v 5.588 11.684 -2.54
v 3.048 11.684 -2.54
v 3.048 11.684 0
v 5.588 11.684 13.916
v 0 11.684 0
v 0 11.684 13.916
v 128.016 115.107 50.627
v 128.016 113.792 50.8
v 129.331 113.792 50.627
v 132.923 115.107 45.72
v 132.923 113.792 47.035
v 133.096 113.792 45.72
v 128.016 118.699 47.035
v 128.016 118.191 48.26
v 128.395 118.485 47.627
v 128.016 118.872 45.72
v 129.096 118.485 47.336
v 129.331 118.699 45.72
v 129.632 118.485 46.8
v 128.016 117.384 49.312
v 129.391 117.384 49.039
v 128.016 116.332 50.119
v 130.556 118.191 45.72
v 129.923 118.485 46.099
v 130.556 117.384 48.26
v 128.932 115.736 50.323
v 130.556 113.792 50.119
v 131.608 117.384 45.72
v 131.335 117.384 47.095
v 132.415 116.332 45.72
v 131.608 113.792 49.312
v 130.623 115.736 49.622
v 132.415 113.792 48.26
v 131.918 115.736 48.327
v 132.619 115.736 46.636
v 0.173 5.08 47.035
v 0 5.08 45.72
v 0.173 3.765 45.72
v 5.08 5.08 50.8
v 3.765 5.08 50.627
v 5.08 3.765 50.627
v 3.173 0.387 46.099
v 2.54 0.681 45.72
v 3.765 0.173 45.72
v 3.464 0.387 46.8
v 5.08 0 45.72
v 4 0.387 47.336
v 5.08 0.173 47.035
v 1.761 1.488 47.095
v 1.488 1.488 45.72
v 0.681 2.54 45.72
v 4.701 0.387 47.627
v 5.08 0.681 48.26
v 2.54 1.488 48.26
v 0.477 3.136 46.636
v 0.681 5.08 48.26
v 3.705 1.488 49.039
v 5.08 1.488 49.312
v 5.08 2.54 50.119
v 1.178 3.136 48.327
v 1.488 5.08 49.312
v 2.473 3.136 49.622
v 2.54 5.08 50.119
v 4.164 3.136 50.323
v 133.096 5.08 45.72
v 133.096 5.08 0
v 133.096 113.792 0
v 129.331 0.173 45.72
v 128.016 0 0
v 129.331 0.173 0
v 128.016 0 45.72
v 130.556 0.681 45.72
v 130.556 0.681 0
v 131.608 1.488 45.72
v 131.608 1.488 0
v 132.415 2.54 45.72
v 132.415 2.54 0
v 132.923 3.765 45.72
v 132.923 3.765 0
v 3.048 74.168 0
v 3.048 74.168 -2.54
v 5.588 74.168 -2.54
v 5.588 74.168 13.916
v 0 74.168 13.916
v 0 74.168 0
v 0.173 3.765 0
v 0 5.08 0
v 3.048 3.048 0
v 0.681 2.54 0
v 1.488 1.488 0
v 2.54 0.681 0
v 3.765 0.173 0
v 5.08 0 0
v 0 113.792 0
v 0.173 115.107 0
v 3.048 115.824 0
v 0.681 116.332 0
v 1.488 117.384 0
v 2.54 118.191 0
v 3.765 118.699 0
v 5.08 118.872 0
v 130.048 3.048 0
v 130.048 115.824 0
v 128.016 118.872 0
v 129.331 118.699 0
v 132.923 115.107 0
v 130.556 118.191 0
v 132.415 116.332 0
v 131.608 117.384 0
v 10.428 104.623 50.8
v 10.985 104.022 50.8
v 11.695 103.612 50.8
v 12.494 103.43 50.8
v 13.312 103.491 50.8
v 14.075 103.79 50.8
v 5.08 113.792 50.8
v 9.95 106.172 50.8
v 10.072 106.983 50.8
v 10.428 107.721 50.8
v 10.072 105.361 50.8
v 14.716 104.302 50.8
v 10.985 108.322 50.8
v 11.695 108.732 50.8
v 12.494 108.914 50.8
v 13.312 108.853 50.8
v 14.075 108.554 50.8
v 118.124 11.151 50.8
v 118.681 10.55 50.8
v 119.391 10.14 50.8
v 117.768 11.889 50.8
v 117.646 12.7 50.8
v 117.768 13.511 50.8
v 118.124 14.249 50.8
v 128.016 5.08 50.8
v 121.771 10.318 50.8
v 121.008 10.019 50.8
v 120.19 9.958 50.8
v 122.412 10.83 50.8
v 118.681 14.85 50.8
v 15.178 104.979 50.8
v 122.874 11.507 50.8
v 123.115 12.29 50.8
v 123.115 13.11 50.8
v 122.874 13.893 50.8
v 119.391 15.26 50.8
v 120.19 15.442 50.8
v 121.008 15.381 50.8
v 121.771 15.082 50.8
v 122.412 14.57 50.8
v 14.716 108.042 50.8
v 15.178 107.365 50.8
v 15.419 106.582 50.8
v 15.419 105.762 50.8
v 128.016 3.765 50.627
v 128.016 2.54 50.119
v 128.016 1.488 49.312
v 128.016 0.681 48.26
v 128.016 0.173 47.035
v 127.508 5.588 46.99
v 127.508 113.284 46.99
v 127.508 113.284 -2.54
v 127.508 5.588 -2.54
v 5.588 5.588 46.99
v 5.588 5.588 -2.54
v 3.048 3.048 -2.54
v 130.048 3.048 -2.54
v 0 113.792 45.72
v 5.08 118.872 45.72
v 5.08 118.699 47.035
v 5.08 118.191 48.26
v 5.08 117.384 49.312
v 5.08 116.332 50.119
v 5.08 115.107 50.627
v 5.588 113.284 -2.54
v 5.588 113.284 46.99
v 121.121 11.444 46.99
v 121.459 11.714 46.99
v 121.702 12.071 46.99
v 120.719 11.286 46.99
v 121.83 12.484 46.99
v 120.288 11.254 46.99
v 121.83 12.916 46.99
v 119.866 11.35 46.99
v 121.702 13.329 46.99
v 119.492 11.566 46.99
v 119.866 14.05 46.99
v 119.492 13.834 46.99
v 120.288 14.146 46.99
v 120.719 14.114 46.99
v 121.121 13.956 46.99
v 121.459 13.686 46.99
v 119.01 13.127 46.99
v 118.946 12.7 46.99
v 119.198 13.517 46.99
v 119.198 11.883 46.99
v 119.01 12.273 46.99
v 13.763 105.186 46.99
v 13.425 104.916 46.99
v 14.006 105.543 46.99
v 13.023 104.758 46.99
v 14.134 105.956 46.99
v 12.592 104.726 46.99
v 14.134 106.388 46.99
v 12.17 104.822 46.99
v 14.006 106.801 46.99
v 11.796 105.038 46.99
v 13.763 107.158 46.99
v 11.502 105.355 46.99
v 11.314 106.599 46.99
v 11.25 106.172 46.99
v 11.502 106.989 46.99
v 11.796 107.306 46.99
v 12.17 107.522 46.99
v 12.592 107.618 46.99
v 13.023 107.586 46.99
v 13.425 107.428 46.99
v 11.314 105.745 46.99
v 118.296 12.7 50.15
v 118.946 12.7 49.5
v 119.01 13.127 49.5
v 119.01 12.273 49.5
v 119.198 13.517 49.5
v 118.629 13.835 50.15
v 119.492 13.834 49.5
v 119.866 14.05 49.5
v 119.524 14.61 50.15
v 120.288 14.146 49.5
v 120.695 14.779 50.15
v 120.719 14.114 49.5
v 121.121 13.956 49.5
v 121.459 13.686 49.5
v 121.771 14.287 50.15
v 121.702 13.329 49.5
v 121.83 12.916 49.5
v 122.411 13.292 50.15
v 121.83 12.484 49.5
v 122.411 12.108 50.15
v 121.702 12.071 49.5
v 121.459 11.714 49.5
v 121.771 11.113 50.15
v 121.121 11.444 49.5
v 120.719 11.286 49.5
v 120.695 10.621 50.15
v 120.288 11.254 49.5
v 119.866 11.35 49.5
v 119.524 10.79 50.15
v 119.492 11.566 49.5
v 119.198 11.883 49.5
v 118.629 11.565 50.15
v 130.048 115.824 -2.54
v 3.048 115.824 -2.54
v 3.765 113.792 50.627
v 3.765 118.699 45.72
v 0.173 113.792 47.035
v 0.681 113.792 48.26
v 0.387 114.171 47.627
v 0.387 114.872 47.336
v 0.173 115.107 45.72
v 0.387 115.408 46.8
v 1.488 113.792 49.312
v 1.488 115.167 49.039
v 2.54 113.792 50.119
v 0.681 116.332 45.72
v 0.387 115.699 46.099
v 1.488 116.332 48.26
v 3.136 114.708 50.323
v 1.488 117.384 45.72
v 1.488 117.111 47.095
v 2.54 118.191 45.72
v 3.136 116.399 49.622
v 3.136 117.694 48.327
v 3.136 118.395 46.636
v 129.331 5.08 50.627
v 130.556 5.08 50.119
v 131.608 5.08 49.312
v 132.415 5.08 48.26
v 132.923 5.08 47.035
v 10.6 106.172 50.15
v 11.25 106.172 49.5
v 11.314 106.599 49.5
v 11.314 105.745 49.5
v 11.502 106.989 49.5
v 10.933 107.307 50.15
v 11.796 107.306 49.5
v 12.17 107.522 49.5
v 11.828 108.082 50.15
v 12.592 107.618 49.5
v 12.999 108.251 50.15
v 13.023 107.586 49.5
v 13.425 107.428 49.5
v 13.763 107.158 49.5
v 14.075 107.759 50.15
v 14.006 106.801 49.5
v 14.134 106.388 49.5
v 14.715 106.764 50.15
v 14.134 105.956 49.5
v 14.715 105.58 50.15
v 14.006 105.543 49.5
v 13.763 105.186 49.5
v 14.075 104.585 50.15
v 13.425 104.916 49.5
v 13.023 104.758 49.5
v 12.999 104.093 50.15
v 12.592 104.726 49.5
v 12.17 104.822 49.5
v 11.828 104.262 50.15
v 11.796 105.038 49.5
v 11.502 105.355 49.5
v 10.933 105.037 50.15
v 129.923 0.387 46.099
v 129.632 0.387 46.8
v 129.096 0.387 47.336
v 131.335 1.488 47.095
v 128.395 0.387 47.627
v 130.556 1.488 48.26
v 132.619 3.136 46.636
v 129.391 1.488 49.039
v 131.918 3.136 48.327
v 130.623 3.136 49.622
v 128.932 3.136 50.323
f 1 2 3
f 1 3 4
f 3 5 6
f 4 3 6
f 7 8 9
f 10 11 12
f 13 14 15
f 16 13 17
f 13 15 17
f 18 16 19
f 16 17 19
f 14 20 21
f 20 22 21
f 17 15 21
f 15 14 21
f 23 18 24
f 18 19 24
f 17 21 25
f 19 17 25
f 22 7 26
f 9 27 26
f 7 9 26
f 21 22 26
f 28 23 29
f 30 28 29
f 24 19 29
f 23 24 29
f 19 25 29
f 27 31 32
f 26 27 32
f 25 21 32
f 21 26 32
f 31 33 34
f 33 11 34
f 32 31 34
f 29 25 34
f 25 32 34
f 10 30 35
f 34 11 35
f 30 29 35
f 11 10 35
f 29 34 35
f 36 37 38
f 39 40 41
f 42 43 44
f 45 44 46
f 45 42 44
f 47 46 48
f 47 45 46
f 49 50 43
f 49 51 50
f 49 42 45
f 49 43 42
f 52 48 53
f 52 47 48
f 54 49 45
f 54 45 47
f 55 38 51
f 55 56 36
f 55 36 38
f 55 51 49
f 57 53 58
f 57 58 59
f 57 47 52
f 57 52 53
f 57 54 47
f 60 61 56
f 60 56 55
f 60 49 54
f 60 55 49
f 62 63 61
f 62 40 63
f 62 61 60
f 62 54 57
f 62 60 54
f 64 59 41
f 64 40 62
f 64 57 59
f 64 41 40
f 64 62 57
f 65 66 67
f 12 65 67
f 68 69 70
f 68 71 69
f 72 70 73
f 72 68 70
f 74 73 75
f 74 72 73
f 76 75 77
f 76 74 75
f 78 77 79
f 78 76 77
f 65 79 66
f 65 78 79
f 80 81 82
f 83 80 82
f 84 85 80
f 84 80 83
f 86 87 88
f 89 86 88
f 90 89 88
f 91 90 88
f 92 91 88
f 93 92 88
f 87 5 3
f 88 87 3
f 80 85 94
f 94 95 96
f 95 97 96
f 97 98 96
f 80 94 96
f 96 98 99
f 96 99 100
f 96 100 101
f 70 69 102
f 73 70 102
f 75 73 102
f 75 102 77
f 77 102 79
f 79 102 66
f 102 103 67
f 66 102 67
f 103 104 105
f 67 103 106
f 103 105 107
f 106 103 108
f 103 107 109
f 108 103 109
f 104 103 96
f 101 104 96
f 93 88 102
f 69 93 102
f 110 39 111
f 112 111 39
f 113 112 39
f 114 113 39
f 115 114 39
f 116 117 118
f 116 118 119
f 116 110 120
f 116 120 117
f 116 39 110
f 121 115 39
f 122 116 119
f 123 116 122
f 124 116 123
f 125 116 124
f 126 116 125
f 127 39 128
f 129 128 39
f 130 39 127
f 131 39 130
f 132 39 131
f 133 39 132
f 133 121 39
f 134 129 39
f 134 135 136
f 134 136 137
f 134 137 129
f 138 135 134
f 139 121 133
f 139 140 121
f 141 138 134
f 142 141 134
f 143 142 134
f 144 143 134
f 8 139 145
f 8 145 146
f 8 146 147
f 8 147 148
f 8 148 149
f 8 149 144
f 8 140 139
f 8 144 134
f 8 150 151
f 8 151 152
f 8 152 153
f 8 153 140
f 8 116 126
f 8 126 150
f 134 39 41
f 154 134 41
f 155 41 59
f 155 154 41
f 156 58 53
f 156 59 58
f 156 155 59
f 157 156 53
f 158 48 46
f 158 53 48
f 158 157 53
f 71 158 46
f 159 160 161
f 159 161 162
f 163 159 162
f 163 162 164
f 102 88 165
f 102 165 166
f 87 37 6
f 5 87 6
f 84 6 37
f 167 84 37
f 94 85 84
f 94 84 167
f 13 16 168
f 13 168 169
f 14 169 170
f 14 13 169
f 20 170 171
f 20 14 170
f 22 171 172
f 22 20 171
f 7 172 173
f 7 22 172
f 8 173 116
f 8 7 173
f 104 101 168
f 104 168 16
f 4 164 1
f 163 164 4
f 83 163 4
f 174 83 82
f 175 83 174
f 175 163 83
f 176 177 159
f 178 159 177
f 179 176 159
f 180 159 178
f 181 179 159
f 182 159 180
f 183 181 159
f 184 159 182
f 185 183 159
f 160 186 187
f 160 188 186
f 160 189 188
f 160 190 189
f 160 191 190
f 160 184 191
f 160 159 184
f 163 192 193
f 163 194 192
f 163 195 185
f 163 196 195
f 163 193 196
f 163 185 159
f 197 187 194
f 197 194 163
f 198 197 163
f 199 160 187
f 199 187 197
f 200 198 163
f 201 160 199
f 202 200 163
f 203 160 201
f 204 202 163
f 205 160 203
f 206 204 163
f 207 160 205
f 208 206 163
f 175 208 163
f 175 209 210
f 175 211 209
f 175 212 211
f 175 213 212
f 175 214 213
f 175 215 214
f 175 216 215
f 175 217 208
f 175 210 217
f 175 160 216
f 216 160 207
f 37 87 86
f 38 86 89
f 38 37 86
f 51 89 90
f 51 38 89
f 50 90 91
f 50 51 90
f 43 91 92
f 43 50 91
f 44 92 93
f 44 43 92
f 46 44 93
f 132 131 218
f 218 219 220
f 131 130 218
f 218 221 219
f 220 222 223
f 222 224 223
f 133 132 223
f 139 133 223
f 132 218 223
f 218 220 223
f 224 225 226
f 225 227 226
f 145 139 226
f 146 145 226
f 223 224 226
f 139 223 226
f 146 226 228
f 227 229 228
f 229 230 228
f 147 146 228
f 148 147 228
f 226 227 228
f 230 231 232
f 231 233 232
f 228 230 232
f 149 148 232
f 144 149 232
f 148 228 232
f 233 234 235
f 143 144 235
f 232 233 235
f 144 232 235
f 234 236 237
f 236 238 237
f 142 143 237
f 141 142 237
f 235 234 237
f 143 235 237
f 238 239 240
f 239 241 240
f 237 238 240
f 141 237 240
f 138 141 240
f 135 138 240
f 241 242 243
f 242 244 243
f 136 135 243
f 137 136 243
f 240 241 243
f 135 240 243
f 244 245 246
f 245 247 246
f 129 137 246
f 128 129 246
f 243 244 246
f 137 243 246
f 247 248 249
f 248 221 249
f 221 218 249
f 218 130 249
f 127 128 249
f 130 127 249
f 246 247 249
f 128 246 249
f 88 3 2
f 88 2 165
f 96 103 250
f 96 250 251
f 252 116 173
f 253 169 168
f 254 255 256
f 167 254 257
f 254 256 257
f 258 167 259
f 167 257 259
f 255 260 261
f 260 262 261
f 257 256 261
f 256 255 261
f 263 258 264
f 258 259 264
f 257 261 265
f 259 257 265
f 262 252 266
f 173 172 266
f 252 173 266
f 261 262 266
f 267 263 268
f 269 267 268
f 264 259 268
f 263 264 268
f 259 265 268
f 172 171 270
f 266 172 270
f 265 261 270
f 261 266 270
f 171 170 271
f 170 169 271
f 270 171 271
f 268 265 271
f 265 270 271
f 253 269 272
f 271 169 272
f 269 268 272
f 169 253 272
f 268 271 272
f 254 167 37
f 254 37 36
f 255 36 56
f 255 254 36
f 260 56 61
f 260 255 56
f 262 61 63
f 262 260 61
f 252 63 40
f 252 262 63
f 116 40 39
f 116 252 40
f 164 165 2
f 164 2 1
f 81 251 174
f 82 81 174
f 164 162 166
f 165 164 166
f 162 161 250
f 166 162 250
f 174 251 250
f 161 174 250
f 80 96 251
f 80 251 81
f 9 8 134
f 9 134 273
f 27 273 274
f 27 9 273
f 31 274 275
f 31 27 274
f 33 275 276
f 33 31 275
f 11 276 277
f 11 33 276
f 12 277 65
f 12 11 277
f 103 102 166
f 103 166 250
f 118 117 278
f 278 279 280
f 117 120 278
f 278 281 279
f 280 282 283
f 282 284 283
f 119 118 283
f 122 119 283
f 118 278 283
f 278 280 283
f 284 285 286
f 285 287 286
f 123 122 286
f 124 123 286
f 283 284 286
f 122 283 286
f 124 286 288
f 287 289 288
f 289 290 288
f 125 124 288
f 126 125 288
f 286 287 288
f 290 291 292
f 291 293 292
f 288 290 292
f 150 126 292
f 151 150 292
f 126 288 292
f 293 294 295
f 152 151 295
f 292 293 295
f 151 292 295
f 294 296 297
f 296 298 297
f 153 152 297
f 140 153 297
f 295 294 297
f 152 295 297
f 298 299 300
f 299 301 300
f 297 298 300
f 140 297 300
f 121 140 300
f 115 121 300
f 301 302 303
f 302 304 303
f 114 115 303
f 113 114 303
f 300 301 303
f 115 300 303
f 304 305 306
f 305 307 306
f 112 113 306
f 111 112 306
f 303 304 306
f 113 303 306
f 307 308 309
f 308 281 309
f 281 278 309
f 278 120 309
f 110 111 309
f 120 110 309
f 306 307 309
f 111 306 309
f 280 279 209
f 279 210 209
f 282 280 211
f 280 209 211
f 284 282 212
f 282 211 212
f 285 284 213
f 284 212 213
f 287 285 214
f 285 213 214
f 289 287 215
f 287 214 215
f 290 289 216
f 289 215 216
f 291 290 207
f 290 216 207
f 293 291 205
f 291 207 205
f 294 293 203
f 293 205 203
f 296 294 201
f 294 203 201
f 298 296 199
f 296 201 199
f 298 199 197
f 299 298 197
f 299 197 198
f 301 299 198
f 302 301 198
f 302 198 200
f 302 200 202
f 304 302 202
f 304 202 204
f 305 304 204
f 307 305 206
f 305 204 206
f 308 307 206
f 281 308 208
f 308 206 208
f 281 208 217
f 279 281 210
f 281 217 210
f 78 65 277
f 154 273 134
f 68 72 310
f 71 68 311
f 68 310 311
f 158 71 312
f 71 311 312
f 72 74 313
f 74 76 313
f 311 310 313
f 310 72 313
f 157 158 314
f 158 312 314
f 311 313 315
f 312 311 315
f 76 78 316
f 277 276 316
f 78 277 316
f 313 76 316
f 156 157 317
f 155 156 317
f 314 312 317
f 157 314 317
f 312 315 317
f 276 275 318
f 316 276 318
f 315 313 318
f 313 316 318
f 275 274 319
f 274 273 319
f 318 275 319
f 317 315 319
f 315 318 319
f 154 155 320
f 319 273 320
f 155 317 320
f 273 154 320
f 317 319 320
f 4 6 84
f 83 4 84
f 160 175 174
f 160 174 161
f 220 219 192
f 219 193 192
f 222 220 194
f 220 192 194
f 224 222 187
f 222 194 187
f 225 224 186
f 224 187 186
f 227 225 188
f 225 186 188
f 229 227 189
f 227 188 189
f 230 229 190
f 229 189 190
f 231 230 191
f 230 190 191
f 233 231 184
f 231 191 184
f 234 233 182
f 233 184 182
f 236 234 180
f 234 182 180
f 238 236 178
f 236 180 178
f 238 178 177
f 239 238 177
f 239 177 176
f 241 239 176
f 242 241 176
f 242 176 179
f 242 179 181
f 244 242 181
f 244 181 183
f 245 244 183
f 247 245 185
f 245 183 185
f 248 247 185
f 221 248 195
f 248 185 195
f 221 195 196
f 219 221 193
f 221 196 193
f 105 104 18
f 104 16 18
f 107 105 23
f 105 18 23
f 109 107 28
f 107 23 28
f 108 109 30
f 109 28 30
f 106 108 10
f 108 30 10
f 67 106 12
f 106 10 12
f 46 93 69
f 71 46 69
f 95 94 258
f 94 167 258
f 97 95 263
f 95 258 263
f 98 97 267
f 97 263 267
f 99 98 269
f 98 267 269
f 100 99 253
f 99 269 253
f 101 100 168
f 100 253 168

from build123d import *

# Parameters (mm, degrees)
SKETCH3_W                                         = 133.096
SKETCH3_H                                         = 118.872
BOSS_EXTRUDE1_DEPTH                               = 50.8
BOSS_EXTRUDE2_DEPTH                               = 2.54
SKETCH11_W                                        = 121.92
SKETCH11_H                                        = 107.696
CUT_EXTRUDE1_DEPTH                                = 46.99
SKETCH12_W                                        = 16.456007839
SKETCH12_H                                        = 62.484
CUT_EXTRUDE2_DEPTH                                = 12.7
FILLET1_R                                         = 5.08
CSK_FOR_M2_5_FLAT_HEAD_MACHINE_SCREW1_D           = 2.9
CSK_FOR_M2_5_FLAT_HEAD_MACHINE_SCREW1_DEPTH       = 5.08
CSK_FOR_M2_5_FLAT_HEAD_MACHINE_SCREW1_CSINK_D     = 5.5
CSK_FOR_M2_5_FLAT_HEAD_MACHINE_SCREW1_CSINK_ANGLE = 90
CSK_FOR_M2_5_FLAT_HEAD_MACHINE_SCREW1_TIP         = 0.871247898


with BuildPart() as part:
    # Sketch3 → Boss-Extrude1 (new body)
    with BuildSketch(Plane.XY):
        with Locations((66.548, 59.436)):
            Rectangle(SKETCH3_W, SKETCH3_H)
    extrude(amount=BOSS_EXTRUDE1_DEPTH)

    # Sketch3<5> → Boss-Extrude2 (add)
    with BuildSketch(Plane.XY):
        Polygon((130.048, 115.824), (3.048, 115.824), (3.048, 74.168), (3.048, 11.684), (3.048, 3.048), (130.048, 3.048), align=None)
        Polygon((5.588, 74.168), (5.588, 113.284), (127.508, 113.284), (127.508, 5.588), (5.588, 5.588), (5.588, 11.684), align=None, mode=Mode.SUBTRACT)
    extrude(amount=-BOSS_EXTRUDE2_DEPTH)

    # Sketch11 → Cut-Extrude1 (cut)
    with BuildSketch(Plane(origin=(0, 0, 0), x_dir=(-1, 0, 0), z_dir=(0, 0, -1))):
        with Locations((-66.548, 59.436)):
            Rectangle(SKETCH11_W, SKETCH11_H)
    extrude(amount=-CUT_EXTRUDE1_DEPTH, mode=Mode.SUBTRACT)

    # Sketch12 → Cut-Extrude2 (cut)
    with BuildSketch(Plane.ZY):
        with Locations((5.688003919, 42.926)):
            Rectangle(SKETCH12_W, SKETCH12_H)
    extrude(amount=-CUT_EXTRUDE2_DEPTH, mode=Mode.SUBTRACT)

    # Fillet1
    fillet1_edges = [part.edges().sort_by_distance(p)[0] for p in [
        (133.096, 59.436, 50.8),
        (66.548, 118.872, 50.8),
        (0, 59.436, 50.8),
        (0, 118.872, 25.4),
        (133.096, 118.872, 25.4),
        (133.096, 0, 25.4),
        (0, 0, 25.4),
        (66.548, 0, 50.8),
    ]]
    fillet(fillet1_edges, radius=FILLET1_R)

    # CSK for M2.5 Flat Head Machine Screw1
    with Locations(Plane.XY.offset(50.8)):
        with Locations((12.7, 106.172), (120.396, 12.7)):
            CounterSinkHole(CSK_FOR_M2_5_FLAT_HEAD_MACHINE_SCREW1_D / 2, CSK_FOR_M2_5_FLAT_HEAD_MACHINE_SCREW1_CSINK_D / 2, depth=CSK_FOR_M2_5_FLAT_HEAD_MACHINE_SCREW1_DEPTH, counter_sink_angle=CSK_FOR_M2_5_FLAT_HEAD_MACHINE_SCREW1_CSINK_ANGLE)
            with Locations((0, 0, -(CSK_FOR_M2_5_FLAT_HEAD_MACHINE_SCREW1_DEPTH + CSK_FOR_M2_5_FLAT_HEAD_MACHINE_SCREW1_TIP / 2))):  # 118° drill point
                Cone(0, CSK_FOR_M2_5_FLAT_HEAD_MACHINE_SCREW1_D / 2, CSK_FOR_M2_5_FLAT_HEAD_MACHINE_SCREW1_TIP, mode=Mode.SUBTRACT)


solid = part.part
